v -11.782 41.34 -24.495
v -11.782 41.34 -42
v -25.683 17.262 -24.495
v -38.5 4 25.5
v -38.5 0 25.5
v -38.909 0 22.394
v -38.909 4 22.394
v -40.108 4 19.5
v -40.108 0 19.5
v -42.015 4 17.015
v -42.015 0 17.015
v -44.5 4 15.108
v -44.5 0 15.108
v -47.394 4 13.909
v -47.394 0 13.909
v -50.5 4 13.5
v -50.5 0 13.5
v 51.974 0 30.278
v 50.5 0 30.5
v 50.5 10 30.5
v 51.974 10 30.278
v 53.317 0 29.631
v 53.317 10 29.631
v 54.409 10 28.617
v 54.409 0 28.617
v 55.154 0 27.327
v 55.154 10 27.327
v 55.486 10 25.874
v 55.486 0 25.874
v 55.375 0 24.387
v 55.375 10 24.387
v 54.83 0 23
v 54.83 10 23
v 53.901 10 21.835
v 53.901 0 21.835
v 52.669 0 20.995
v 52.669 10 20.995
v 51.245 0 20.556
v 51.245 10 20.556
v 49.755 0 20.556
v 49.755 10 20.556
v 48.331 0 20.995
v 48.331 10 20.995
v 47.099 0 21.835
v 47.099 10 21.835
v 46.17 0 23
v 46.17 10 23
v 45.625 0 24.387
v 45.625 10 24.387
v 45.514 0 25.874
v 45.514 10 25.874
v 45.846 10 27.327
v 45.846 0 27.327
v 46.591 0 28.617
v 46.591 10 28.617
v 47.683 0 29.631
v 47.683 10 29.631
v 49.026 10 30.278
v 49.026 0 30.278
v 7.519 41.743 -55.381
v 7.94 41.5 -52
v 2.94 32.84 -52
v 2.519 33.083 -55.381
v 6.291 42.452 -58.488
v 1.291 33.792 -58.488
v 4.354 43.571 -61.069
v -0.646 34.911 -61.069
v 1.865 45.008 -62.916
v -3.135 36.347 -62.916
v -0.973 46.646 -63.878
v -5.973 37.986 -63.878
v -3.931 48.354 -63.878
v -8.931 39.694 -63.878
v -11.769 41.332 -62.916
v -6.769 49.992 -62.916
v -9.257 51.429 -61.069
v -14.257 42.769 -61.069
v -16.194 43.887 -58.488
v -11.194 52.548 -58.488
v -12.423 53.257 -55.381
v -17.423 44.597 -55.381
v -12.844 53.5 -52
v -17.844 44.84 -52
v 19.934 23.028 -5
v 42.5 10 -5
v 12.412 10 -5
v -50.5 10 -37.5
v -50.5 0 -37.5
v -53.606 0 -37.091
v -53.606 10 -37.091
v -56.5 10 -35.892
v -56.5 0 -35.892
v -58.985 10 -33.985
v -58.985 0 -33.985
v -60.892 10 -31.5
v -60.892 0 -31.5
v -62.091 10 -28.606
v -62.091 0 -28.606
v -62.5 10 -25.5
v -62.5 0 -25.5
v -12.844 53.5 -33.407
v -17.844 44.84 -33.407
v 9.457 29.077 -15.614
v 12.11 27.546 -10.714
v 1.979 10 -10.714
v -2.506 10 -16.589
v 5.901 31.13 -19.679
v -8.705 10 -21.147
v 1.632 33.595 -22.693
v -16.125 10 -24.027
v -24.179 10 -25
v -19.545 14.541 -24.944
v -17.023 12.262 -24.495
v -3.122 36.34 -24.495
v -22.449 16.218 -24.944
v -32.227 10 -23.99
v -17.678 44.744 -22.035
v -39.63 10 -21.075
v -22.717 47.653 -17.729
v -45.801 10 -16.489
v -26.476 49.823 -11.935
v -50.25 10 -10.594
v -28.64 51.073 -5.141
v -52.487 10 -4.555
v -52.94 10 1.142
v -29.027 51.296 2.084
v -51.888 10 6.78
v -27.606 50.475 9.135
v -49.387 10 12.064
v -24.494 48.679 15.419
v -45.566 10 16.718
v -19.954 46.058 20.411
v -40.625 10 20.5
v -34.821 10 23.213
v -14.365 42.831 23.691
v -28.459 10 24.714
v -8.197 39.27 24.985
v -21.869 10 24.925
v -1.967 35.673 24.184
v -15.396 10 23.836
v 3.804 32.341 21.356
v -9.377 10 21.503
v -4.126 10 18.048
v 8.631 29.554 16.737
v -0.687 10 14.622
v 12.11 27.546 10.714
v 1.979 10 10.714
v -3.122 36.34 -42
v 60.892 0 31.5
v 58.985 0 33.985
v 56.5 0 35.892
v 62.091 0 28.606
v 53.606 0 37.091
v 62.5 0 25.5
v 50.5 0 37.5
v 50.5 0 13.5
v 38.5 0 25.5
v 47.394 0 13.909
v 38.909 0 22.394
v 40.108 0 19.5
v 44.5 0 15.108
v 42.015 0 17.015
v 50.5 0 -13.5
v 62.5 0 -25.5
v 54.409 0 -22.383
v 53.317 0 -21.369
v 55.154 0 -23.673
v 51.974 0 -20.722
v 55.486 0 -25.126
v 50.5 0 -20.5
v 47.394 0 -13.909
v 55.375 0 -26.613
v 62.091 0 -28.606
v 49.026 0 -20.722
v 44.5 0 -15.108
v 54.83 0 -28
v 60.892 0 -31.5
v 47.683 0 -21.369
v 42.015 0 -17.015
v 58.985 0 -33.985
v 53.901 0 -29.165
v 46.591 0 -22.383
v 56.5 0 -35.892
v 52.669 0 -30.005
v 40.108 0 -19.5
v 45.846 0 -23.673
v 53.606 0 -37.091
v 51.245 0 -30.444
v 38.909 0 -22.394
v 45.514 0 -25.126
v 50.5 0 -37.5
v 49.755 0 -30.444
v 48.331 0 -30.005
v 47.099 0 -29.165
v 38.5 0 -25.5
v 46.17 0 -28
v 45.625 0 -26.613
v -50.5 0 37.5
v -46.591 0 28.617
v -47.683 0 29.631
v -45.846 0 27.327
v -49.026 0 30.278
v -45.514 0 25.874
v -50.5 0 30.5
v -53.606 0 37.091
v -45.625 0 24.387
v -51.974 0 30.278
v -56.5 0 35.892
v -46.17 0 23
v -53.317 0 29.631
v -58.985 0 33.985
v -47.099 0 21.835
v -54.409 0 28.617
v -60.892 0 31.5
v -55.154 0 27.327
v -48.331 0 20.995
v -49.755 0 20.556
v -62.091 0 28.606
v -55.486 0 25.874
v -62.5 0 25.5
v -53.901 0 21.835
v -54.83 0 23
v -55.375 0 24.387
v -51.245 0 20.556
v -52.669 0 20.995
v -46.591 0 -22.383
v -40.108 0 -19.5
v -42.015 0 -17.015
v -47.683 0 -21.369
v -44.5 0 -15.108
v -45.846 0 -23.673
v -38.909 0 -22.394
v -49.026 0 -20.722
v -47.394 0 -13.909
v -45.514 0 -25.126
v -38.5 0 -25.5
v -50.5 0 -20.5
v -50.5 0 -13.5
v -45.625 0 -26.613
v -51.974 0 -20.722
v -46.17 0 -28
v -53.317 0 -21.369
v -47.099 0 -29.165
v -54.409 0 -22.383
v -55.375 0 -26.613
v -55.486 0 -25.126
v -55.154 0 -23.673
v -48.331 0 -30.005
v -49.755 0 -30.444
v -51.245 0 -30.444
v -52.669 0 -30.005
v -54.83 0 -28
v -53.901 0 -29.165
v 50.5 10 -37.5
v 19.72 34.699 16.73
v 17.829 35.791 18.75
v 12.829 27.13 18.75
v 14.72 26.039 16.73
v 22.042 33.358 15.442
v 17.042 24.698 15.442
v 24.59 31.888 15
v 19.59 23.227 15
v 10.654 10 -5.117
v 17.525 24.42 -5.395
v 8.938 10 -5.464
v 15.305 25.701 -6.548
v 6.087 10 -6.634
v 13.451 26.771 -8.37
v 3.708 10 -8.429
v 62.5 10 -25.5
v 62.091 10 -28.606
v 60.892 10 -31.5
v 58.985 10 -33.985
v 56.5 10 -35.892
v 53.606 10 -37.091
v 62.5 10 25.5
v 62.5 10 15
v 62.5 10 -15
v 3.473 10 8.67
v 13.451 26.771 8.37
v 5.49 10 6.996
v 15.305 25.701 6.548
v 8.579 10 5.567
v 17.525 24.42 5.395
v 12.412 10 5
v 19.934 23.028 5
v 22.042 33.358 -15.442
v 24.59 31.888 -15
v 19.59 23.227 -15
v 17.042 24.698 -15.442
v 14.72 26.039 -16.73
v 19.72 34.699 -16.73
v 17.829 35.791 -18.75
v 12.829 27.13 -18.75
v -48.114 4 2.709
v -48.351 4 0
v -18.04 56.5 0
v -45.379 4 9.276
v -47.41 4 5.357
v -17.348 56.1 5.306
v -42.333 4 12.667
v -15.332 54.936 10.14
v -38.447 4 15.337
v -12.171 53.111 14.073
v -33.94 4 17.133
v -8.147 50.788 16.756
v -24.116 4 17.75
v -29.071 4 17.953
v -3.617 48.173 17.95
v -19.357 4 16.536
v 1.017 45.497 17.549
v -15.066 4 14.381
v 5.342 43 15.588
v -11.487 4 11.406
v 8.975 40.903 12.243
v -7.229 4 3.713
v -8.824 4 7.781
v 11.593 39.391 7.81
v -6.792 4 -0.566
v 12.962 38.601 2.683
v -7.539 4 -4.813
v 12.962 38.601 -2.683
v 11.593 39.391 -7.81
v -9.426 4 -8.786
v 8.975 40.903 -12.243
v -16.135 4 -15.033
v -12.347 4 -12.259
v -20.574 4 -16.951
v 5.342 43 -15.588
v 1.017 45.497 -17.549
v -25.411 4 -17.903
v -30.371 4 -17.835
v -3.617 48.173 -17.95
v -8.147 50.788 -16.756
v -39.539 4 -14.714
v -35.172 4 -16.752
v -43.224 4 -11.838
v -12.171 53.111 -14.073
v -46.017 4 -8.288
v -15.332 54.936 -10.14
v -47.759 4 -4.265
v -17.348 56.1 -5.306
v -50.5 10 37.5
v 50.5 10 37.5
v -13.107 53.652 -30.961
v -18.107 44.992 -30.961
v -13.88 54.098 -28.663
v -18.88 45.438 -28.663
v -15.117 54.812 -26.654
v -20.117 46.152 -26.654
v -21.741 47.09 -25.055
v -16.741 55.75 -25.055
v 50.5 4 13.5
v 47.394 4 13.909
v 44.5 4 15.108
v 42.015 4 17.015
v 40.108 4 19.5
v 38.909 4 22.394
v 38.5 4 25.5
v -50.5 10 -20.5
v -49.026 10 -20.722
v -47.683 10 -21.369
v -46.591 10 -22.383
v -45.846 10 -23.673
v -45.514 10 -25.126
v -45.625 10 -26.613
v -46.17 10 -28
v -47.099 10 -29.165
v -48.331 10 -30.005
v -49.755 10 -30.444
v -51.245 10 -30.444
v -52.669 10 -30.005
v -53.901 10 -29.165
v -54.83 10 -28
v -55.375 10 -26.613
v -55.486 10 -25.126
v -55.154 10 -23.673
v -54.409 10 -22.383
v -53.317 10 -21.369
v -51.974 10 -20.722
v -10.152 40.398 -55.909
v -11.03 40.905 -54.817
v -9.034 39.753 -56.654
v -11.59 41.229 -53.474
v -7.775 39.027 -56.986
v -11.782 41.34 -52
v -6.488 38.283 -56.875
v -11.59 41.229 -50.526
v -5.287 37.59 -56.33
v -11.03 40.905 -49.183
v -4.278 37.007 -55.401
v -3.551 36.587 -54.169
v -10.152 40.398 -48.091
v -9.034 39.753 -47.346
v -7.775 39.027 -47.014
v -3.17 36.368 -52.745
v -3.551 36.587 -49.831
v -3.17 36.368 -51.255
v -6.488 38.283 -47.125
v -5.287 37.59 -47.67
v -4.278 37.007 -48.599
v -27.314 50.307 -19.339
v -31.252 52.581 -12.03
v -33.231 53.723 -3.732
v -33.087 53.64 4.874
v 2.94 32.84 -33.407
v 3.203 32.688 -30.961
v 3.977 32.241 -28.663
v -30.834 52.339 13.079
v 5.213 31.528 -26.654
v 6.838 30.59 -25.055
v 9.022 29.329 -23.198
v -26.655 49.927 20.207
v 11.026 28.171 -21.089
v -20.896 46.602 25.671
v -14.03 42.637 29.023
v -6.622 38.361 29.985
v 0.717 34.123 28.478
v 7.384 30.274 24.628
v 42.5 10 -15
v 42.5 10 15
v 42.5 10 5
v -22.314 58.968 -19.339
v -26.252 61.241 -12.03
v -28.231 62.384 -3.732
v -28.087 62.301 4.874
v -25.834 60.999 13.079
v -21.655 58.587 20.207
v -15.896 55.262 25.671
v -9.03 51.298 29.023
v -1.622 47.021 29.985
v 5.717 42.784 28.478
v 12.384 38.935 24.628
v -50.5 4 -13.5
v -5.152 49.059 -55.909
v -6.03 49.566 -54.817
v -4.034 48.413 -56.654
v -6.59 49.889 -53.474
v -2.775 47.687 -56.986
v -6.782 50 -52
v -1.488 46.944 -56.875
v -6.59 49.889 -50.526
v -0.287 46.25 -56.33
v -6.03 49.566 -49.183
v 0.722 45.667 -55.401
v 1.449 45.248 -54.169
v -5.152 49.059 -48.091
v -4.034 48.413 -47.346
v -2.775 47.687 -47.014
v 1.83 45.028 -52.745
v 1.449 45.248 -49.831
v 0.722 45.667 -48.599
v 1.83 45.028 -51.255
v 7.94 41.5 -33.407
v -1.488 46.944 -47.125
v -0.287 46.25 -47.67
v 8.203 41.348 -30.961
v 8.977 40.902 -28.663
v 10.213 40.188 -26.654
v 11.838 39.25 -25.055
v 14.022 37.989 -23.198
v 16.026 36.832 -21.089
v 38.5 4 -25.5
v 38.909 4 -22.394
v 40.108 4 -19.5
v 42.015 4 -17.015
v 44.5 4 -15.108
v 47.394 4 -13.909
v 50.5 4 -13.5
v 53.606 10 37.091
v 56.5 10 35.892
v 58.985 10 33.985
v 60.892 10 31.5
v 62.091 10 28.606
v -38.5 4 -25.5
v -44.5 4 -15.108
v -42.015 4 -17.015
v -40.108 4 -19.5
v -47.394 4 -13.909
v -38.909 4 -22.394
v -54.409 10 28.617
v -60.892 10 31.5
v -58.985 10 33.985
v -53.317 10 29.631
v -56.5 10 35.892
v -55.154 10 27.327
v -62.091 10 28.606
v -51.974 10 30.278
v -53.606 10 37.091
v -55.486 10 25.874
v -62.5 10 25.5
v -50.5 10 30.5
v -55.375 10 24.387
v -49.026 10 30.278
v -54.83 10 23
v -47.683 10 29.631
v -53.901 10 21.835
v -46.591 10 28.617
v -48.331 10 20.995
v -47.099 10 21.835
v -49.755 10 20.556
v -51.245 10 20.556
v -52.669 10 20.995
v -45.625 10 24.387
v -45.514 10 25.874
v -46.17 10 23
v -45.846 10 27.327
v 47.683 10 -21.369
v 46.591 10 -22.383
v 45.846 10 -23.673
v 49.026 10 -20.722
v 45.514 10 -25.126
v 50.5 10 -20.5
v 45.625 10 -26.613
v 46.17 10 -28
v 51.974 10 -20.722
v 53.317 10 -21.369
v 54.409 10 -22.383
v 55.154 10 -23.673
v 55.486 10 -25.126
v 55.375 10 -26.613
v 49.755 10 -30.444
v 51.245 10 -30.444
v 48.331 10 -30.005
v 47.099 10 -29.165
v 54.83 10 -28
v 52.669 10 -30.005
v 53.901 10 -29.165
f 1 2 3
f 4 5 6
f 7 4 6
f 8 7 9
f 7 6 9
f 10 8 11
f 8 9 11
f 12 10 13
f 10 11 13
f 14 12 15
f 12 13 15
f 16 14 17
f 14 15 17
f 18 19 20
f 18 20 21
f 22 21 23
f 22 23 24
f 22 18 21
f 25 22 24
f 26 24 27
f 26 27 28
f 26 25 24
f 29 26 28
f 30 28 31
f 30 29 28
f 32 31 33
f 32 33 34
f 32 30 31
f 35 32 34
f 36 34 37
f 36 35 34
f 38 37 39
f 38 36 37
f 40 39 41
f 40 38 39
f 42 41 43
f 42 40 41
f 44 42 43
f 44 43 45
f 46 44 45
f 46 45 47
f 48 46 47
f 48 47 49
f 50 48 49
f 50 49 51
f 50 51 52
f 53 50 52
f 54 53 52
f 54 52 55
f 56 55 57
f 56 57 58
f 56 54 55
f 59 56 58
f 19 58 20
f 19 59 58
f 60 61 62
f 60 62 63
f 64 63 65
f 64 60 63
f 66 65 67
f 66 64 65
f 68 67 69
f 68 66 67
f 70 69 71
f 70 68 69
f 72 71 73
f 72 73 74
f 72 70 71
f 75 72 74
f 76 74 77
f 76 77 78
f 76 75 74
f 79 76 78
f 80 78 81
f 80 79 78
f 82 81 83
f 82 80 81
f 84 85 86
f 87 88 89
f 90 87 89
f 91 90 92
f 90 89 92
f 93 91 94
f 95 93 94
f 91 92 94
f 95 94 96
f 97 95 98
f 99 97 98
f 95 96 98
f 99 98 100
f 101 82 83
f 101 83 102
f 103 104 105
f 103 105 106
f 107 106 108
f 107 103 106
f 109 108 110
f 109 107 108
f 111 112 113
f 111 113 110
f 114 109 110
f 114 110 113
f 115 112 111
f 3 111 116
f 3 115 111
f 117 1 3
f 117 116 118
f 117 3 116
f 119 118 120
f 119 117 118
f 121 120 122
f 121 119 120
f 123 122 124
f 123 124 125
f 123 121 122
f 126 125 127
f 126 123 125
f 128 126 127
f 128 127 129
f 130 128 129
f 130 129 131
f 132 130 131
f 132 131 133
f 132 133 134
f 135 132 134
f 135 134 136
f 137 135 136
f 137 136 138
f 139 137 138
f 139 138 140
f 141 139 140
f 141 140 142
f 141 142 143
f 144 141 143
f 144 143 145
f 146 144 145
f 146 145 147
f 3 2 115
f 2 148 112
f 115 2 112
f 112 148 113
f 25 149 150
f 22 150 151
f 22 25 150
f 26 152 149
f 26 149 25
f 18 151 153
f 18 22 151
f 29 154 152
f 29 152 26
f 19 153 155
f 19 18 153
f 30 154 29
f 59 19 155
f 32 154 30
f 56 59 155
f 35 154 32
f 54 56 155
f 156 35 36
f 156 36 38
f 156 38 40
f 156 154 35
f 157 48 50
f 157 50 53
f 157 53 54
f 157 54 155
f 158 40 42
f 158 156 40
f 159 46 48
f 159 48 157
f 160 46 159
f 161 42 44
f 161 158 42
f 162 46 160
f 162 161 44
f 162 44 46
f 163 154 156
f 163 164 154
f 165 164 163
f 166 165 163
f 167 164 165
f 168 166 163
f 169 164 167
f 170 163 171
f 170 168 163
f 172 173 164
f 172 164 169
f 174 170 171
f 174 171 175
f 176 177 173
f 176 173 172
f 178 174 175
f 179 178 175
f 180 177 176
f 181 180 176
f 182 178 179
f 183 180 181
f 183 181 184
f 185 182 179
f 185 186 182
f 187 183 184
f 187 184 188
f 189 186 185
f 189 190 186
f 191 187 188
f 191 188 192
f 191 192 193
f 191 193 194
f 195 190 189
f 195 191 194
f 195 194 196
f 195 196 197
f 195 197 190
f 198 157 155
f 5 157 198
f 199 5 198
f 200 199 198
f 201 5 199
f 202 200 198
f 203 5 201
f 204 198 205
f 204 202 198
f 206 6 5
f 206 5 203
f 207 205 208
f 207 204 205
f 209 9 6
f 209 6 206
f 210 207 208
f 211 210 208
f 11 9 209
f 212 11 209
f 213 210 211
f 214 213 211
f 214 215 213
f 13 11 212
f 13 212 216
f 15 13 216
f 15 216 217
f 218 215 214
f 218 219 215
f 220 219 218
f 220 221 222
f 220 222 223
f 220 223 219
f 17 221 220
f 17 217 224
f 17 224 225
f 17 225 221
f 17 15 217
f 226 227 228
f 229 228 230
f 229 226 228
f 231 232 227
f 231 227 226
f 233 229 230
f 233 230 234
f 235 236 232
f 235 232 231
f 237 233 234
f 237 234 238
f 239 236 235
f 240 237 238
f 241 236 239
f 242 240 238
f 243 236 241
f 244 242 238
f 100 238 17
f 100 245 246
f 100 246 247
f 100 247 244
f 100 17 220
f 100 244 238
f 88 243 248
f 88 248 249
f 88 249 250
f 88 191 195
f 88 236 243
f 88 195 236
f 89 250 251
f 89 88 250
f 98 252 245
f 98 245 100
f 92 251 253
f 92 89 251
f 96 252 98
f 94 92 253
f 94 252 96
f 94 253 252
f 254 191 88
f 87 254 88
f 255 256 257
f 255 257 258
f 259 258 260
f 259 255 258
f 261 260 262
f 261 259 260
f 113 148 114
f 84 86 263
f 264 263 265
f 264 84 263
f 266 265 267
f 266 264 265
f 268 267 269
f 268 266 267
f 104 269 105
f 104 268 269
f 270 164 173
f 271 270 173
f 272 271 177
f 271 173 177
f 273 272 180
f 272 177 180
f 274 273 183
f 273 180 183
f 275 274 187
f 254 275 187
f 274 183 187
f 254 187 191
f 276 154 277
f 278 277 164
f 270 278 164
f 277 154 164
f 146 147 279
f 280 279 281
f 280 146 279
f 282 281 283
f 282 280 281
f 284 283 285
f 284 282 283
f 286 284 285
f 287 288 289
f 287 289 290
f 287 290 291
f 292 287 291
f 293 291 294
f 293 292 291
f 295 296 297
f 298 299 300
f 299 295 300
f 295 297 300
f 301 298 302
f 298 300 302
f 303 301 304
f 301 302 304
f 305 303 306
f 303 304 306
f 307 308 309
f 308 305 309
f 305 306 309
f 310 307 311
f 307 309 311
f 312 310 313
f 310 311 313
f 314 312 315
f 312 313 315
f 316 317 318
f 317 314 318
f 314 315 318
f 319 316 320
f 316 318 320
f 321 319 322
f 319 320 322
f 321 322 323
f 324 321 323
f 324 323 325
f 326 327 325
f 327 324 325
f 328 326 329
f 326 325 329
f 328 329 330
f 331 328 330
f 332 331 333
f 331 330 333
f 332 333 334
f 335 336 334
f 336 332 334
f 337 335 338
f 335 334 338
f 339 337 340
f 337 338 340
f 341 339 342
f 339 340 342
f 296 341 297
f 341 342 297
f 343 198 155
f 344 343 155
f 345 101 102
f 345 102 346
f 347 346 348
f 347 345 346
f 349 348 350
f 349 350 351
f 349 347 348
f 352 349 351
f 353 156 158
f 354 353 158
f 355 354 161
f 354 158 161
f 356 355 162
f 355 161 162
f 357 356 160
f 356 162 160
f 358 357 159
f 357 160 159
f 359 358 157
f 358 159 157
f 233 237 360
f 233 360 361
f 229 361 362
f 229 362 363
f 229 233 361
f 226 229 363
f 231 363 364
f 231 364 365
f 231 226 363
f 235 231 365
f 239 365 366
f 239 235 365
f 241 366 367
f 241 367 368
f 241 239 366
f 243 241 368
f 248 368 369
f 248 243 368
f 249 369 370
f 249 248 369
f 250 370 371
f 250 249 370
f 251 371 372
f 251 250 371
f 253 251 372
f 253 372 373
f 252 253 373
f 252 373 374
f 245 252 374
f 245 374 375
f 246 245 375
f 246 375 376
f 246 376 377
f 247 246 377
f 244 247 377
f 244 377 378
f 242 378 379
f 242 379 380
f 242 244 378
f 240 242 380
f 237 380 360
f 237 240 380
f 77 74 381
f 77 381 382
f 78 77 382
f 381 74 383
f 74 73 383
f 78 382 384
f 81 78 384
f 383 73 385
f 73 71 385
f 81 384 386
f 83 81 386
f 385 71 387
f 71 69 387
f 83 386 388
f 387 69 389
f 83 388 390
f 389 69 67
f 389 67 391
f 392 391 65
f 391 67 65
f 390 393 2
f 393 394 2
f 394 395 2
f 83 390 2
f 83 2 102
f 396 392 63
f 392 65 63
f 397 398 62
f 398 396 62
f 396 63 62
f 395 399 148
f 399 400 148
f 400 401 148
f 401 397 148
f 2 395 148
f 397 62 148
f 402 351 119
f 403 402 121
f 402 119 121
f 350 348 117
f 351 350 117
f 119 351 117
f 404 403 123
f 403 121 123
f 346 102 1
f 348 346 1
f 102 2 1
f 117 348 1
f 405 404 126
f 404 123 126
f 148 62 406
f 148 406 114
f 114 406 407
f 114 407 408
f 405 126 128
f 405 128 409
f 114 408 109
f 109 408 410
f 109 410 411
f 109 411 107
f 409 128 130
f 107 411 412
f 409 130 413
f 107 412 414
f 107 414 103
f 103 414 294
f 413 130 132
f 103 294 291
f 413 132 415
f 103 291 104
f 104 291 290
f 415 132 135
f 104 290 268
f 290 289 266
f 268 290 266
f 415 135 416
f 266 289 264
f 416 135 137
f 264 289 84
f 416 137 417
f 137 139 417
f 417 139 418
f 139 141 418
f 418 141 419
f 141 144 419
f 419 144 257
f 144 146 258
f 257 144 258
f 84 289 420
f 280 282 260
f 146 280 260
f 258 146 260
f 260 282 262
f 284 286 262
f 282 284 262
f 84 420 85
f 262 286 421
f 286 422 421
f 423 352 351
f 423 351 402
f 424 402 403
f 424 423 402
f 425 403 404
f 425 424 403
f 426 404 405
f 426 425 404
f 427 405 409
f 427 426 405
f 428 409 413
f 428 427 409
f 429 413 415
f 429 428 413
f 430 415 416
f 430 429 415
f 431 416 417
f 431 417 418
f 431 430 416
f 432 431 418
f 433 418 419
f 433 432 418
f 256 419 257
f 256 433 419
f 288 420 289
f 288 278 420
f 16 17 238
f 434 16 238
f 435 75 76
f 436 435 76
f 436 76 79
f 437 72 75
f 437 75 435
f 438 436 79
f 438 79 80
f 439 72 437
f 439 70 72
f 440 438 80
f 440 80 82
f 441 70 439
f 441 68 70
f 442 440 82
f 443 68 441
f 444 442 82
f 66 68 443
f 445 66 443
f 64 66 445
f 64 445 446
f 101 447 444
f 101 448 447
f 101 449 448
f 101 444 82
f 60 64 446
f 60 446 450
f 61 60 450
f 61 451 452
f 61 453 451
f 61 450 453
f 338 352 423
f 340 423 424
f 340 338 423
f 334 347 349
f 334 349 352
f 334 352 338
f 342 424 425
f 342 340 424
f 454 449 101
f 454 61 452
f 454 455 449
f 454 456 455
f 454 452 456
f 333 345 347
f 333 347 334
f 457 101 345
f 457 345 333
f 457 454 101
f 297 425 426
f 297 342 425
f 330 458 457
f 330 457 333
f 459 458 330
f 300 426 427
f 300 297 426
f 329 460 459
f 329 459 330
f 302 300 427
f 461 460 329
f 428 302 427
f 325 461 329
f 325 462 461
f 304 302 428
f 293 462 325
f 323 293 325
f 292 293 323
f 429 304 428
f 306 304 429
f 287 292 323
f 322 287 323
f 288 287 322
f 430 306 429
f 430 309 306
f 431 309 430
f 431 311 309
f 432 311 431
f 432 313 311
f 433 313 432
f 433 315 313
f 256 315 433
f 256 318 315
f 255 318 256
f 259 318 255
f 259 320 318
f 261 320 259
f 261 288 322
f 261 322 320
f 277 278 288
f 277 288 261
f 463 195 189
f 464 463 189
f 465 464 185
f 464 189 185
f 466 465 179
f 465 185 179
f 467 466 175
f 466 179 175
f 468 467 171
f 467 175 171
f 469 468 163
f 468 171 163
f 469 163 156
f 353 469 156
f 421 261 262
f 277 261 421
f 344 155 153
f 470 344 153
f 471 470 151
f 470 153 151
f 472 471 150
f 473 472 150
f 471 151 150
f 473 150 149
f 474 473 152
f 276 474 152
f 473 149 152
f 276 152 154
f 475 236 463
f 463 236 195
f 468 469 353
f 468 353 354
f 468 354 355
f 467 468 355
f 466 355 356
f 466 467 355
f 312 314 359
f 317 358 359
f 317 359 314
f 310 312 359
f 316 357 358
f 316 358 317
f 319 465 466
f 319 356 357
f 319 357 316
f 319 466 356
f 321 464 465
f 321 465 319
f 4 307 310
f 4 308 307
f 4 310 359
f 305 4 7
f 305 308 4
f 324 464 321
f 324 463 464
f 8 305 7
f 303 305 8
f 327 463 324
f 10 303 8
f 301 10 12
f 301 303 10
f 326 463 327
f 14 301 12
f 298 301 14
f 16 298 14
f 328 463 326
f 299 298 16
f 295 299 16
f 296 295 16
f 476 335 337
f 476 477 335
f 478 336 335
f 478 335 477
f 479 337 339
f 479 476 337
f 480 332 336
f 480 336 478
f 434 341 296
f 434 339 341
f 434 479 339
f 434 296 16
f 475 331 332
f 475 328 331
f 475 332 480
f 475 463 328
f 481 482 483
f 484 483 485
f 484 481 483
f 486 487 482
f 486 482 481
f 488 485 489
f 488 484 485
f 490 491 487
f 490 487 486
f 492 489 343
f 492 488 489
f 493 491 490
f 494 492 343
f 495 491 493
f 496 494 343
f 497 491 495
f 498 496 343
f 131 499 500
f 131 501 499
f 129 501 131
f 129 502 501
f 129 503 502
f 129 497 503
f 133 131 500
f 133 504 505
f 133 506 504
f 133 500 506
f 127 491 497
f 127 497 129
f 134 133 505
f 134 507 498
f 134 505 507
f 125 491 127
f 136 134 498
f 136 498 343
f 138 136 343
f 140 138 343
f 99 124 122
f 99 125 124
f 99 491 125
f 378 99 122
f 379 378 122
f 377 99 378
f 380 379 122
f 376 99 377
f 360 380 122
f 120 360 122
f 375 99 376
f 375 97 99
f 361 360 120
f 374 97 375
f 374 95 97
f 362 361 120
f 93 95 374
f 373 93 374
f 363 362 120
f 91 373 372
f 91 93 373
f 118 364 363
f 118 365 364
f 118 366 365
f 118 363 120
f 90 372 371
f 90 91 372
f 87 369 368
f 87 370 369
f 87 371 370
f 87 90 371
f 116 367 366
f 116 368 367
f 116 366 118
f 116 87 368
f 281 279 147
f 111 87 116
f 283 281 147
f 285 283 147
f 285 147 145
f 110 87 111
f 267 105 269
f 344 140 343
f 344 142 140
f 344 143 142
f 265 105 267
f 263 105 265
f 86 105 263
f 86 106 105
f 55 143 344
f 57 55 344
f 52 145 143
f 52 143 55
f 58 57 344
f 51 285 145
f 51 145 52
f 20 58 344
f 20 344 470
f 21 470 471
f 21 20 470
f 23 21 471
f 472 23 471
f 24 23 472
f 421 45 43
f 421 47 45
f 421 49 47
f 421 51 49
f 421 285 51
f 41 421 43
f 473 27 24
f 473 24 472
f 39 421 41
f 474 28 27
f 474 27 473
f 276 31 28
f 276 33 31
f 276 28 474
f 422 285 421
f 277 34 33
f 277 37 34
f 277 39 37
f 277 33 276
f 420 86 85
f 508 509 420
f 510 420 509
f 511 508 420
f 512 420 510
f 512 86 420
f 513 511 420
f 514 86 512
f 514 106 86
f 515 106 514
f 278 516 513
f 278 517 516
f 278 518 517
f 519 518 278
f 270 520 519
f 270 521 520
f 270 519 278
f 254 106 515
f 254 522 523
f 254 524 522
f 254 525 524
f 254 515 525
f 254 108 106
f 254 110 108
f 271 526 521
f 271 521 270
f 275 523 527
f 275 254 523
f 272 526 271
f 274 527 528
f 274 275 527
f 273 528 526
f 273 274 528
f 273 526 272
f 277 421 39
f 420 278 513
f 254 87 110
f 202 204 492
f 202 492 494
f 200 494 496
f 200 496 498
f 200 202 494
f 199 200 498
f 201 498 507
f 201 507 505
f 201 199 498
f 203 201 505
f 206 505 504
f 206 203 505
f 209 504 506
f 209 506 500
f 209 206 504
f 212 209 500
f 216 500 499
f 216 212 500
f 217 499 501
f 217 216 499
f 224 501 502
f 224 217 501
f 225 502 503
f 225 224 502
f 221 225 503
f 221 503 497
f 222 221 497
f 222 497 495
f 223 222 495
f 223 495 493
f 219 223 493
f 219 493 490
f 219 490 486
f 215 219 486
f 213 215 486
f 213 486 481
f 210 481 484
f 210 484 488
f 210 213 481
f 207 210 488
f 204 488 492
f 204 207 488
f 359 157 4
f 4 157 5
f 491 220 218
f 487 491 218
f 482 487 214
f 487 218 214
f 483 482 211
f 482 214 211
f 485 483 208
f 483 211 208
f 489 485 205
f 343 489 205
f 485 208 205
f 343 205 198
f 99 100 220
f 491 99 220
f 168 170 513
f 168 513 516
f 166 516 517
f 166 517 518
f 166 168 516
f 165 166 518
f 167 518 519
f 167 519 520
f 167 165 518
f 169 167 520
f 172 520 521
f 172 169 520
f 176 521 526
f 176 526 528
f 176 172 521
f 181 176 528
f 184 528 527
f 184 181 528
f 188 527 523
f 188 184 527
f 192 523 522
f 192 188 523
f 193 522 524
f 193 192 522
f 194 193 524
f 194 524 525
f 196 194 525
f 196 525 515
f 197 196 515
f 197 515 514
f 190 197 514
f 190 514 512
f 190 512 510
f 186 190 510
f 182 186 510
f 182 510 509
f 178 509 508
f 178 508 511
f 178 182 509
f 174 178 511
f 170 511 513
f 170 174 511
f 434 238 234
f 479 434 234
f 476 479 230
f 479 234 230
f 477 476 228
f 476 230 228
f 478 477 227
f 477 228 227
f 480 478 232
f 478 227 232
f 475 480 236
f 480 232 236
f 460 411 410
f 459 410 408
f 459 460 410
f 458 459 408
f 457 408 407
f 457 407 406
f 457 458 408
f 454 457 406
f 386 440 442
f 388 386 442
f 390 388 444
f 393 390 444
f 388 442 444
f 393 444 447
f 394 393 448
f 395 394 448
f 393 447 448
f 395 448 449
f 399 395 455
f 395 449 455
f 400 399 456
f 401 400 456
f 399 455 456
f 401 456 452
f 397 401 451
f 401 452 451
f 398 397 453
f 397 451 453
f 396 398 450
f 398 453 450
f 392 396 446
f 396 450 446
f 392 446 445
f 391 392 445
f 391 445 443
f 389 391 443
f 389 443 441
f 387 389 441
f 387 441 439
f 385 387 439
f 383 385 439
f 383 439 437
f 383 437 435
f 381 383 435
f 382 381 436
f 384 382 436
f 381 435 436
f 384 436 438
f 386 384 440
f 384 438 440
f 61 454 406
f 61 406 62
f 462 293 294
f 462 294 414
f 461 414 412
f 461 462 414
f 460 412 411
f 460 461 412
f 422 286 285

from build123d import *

# Parameters (mm, degrees)
SKETCH_7_R          = 5
EXTRUDE_5_DEPTH     = 10
CUT_EXTRUDE_3_DEPTH = 4
SKETCH_8_R          = 5
EXTRUDE_8_DEPTH     = 10
EXTRUDE_9_REACH     = 111.952
SKETCH_8_6_R        = 18
CUT_EXTRUDE_5_REACH = 111.952
SKETCH_8_7_R        = 18
RIB_9_REACH         = 119.31
SKETCH_10_WALL_W    = 268.526863554
SKETCH_10_WALL_H    = 10


with BuildPart() as part:
    # 草图7 → 凸台-拉伸5 (new body)
    with BuildSketch(Plane(origin=(0, 0, 0), x_dir=(1, 0, 0), z_dir=(0, 1, 0))):
        with BuildLine():
            Line((50.5, 37.5), (-50.5, 37.5))
            ThreePointArc((-50.5, 37.5), (-58.985281374, 33.985281374), (-62.5, 25.5))
            Line((-62.5, 25.5), (-62.5, -25.5))
            ThreePointArc((-62.5, -25.5), (-58.985281374, -33.985281374), (-50.5, -37.5))
            Line((-50.5, -37.5), (50.5, -37.5))
            ThreePointArc((50.5, -37.5), (58.985281374, -33.985281374), (62.5, -25.5))
            Line((62.5, -25.5), (62.5, 25.5))
            ThreePointArc((62.5, 25.5), (58.985281374, 33.985281374), (50.5, 37.5))
        make_face()
        with Locations((-50.5, -25.5)):
            Circle(SKETCH_7_R, mode=Mode.SUBTRACT)
        with Locations((50.5, -25.5)):
            Circle(SKETCH_7_R, mode=Mode.SUBTRACT)
        with Locations((-50.5, 25.5)):
            Circle(SKETCH_7_R, mode=Mode.SUBTRACT)
        with Locations((50.5, 25.5)):
            Circle(SKETCH_7_R, mode=Mode.SUBTRACT)
    extrude(amount=EXTRUDE_5_DEPTH)

    # 草图7<3> → 切除-拉伸3 (cut)
    with BuildSketch(Plane(origin=(0, 0, 0), x_dir=(1, 0, 0), z_dir=(0, 1, 0))):
        with BuildLine():
            Line((38.5, 25.5), (-38.5, 25.5))
            ThreePointArc((-38.5, 25.5), (-42.014718626, 17.014718626), (-50.5, 13.5))
            Line((-50.5, 13.5), (-50.5, -13.5))
            ThreePointArc((-50.5, -13.5), (-42.014718626, -17.014718626), (-38.5, -25.5))
            Line((-38.5, -25.5), (38.5, -25.5))
            ThreePointArc((38.5, -25.5), (42.014718626, -17.014718626), (50.5, -13.5))
            Line((50.5, -13.5), (50.5, 13.5))
            ThreePointArc((50.5, 13.5), (42.014718626, 17.014718626), (38.5, 25.5))
        make_face()
    extrude(amount=CUT_EXTRUDE_3_DEPTH, mode=Mode.SUBTRACT)

    # 草图8 → 凸台-拉伸8 (add)
    with BuildSketch(Plane(origin=(19.955127019, 34.563293868, 0), x_dir=(0, 0, 1), z_dir=(0.500000000000001, 0.866025403784438, 0))):
        with BuildLine():
            Line((-5, 5.749364338), (-5, 49.126587737))
            Line((-5, 49.126587737), (-15, 49.126587737))
            Line((-15, 49.126587737), (-15, 5.351577729))
            ThreePointArc((-15, 5.351577729), (-15.986121811, 1.02145071), (-18.75, -2.454669769))
            ThreePointArc((-18.75, -2.454669769), (-22.173981002, -5.666617205), (-25.054939633, -9.373412263))
            ThreePointArc((-25.054939633, -9.373412263), (-28.663169687, -12.676820694), (-33.406586177, -13.873412263))
            Line((-33.406586177, -13.873412263), (-52, -13.873412263))
            ThreePointArc((-52, -13.873412263), (-64, -25.873412263), (-52, -37.873412263))
            Line((-52, -37.873412263), (-33.406586177, -37.873412263))
            ThreePointArc((-33.406586177, -37.873412263), (-28.663169687, -39.070003833), (-25.054939633, -42.373412263))
            ThreePointArc((-25.054939633, -42.373412263), (20.206795058, -48.047393266), (18.75, -2.454669769))
            ThreePointArc((18.75, -2.454669769), (15.986121811, 1.02145071), (15, 5.351577729))
            Line((15, 5.351577729), (15, 49.126587737))
            Line((15, 49.126587737), (5, 49.126587737))
            Line((5, 49.126587737), (5, 5.749364338))
            ThreePointArc((5, 5.749364338), (6.548457453, 0.4041395), (10.714285714, -3.285714691))
            ThreePointArc((10.714285714, -3.285714691), (0, -50.873412263), (-10.714285714, -3.285714691))
            ThreePointArc((-10.714285714, -3.285714691), (-6.548457453, 0.4041395), (-5, 5.749364338))
        make_face()
        with Locations((-52, -25.873412263)):
            Circle(SKETCH_8_R, mode=Mode.SUBTRACT)
    extrude(amount=-EXTRUDE_8_DEPTH)

    # 草图8<6> → 凸台-拉伸9 (add, up to next)
    with BuildSketch(Plane(origin=(19.955127019, 34.563293868, 0), x_dir=(0, 0, 1), z_dir=(0.500000000000001, 0.866025403784438, 0)), mode=Mode.PRIVATE) as extrude_9_sk1:
        with BuildLine():
            Line((5, 49.126587737), (-5, 49.126587737))
            Line((-5, 49.126587737), (-5, 5.749364338))
            ThreePointArc((-5, 5.749364338), (-6.548457453, 0.4041395), (-10.714285714, -3.285714691))
            ThreePointArc((-10.714285714, -3.285714691), (0, -50.873412263), (10.714285714, -3.285714691))
            ThreePointArc((10.714285714, -3.285714691), (6.548457453, 0.4041395), (5, 5.749364338))
            Line((5, 5.749364338), (5, 49.126587737))
        make_face()
        with Locations((0, -25.873412263)):
            Circle(SKETCH_8_6_R, mode=Mode.SUBTRACT)
    extrude_9_tool1 = extrude(extrude_9_sk1.sketch, amount=-EXTRUDE_9_REACH, mode=Mode.PRIVATE) - part.part
    add(extrude_9_tool1.solids().sort_by_distance((43.717111, 20.844306, 3.881966))[0])

    # 草图8<7> → 切除-拉伸5 (cut, up to next)
    with BuildSketch(Plane(origin=(19.955127019, 34.563293868, 0), x_dir=(0, 0, 1), z_dir=(0.500000000000001, 0.866025403784438, 0)), mode=Mode.PRIVATE) as cut_extrude_5_sk1:
        with Locations((0, -25.873412263)):
            Circle(SKETCH_8_7_R)
    cut_extrude_5_tool1 = extrude(cut_extrude_5_sk1.sketch, amount=-CUT_EXTRUDE_5_REACH, mode=Mode.PRIVATE) & part.part
    add(cut_extrude_5_tool1.solids().sort_by_distance((-2.451905, 47.5, 0))[0], mode=Mode.SUBTRACT)

    # 草图10 wall → 筋9 (add, up to next)
    with BuildSketch(Plane(origin=(-14.201905284, 27.148403011, -33.5), x_dir=(-0.423116420047, -0.732859137032, 0.532813269688), z_dir=(0.266406634844, 0.461429827024, 0.846232840088)), mode=Mode.PRIVATE) as rib_9_sk1:
        Rectangle(SKETCH_10_WALL_W, SKETCH_10_WALL_H)
    rib_9_tool1 = extrude(rib_9_sk1.sketch, amount=RIB_9_REACH, mode=Mode.PRIVATE) - part.part
    add(rib_9_tool1.solids().sort_by_distance((-14.201905284, 27.148403011, -33.5))[0])


solid = part.part
